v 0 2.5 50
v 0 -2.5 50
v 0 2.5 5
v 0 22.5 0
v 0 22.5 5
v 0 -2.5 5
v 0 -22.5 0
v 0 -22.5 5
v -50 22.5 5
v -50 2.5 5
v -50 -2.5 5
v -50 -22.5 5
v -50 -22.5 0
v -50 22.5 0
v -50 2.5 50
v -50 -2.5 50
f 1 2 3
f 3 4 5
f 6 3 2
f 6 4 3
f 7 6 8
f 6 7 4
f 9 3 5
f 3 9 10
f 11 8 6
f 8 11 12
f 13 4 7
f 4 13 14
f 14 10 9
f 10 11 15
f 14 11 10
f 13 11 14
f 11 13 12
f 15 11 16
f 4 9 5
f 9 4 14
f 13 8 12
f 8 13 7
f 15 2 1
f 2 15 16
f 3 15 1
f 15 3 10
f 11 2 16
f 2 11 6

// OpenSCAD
// Built by bench/smallmodels/features/compiler.py from a list of features.
$fn = 64;
difference() {
  union() {
    translate([-25, 0, 0]) translate([-25, -22.5, 0]) cube([50, 45, 5]);
    translate([-25, 0, 0]) translate([-25, -2.5, 0]) cube([50, 5, 50]);
  }
  union() {
    translate([-17, 30, 3.75]) rotate([0, 0, 0]) rotate([0, 90, 0]) cylinder(d = 4.5, h = 1200, center = true);
    translate([17, 30, 3.75]) rotate([0, 0, 0]) rotate([0, 90, 0]) cylinder(d = 4.5, h = 1200, center = true);
  }
}
difference() {
  union() {
    translate([-25, 0, 0]) translate([-25, -2.5, 0]) cube([50, 5, 50]);
  }
  union() {
    translate([0, 2.5, -1]) rotate([0, 0, 0]) cylinder(d = 23, h = 52);
    translate([-15.5, 2.5, -1]) rotate([0, 0, 0]) cylinder(d = 3.4, h = 52);
    translate([-15.5, 2.5, -1]) rotate([0, 0, 90]) cylinder(d = 3.4, h = 52);
    translate([-15.5, 2.5, -1]) rotate([0, 0, 180]) cylinder(d = 3.4, h = 52);
    translate([-15.5, 2.5, -1]) rotate([0, 0, 270]) cylinder(d = 3.4, h = 52);
  }
}
